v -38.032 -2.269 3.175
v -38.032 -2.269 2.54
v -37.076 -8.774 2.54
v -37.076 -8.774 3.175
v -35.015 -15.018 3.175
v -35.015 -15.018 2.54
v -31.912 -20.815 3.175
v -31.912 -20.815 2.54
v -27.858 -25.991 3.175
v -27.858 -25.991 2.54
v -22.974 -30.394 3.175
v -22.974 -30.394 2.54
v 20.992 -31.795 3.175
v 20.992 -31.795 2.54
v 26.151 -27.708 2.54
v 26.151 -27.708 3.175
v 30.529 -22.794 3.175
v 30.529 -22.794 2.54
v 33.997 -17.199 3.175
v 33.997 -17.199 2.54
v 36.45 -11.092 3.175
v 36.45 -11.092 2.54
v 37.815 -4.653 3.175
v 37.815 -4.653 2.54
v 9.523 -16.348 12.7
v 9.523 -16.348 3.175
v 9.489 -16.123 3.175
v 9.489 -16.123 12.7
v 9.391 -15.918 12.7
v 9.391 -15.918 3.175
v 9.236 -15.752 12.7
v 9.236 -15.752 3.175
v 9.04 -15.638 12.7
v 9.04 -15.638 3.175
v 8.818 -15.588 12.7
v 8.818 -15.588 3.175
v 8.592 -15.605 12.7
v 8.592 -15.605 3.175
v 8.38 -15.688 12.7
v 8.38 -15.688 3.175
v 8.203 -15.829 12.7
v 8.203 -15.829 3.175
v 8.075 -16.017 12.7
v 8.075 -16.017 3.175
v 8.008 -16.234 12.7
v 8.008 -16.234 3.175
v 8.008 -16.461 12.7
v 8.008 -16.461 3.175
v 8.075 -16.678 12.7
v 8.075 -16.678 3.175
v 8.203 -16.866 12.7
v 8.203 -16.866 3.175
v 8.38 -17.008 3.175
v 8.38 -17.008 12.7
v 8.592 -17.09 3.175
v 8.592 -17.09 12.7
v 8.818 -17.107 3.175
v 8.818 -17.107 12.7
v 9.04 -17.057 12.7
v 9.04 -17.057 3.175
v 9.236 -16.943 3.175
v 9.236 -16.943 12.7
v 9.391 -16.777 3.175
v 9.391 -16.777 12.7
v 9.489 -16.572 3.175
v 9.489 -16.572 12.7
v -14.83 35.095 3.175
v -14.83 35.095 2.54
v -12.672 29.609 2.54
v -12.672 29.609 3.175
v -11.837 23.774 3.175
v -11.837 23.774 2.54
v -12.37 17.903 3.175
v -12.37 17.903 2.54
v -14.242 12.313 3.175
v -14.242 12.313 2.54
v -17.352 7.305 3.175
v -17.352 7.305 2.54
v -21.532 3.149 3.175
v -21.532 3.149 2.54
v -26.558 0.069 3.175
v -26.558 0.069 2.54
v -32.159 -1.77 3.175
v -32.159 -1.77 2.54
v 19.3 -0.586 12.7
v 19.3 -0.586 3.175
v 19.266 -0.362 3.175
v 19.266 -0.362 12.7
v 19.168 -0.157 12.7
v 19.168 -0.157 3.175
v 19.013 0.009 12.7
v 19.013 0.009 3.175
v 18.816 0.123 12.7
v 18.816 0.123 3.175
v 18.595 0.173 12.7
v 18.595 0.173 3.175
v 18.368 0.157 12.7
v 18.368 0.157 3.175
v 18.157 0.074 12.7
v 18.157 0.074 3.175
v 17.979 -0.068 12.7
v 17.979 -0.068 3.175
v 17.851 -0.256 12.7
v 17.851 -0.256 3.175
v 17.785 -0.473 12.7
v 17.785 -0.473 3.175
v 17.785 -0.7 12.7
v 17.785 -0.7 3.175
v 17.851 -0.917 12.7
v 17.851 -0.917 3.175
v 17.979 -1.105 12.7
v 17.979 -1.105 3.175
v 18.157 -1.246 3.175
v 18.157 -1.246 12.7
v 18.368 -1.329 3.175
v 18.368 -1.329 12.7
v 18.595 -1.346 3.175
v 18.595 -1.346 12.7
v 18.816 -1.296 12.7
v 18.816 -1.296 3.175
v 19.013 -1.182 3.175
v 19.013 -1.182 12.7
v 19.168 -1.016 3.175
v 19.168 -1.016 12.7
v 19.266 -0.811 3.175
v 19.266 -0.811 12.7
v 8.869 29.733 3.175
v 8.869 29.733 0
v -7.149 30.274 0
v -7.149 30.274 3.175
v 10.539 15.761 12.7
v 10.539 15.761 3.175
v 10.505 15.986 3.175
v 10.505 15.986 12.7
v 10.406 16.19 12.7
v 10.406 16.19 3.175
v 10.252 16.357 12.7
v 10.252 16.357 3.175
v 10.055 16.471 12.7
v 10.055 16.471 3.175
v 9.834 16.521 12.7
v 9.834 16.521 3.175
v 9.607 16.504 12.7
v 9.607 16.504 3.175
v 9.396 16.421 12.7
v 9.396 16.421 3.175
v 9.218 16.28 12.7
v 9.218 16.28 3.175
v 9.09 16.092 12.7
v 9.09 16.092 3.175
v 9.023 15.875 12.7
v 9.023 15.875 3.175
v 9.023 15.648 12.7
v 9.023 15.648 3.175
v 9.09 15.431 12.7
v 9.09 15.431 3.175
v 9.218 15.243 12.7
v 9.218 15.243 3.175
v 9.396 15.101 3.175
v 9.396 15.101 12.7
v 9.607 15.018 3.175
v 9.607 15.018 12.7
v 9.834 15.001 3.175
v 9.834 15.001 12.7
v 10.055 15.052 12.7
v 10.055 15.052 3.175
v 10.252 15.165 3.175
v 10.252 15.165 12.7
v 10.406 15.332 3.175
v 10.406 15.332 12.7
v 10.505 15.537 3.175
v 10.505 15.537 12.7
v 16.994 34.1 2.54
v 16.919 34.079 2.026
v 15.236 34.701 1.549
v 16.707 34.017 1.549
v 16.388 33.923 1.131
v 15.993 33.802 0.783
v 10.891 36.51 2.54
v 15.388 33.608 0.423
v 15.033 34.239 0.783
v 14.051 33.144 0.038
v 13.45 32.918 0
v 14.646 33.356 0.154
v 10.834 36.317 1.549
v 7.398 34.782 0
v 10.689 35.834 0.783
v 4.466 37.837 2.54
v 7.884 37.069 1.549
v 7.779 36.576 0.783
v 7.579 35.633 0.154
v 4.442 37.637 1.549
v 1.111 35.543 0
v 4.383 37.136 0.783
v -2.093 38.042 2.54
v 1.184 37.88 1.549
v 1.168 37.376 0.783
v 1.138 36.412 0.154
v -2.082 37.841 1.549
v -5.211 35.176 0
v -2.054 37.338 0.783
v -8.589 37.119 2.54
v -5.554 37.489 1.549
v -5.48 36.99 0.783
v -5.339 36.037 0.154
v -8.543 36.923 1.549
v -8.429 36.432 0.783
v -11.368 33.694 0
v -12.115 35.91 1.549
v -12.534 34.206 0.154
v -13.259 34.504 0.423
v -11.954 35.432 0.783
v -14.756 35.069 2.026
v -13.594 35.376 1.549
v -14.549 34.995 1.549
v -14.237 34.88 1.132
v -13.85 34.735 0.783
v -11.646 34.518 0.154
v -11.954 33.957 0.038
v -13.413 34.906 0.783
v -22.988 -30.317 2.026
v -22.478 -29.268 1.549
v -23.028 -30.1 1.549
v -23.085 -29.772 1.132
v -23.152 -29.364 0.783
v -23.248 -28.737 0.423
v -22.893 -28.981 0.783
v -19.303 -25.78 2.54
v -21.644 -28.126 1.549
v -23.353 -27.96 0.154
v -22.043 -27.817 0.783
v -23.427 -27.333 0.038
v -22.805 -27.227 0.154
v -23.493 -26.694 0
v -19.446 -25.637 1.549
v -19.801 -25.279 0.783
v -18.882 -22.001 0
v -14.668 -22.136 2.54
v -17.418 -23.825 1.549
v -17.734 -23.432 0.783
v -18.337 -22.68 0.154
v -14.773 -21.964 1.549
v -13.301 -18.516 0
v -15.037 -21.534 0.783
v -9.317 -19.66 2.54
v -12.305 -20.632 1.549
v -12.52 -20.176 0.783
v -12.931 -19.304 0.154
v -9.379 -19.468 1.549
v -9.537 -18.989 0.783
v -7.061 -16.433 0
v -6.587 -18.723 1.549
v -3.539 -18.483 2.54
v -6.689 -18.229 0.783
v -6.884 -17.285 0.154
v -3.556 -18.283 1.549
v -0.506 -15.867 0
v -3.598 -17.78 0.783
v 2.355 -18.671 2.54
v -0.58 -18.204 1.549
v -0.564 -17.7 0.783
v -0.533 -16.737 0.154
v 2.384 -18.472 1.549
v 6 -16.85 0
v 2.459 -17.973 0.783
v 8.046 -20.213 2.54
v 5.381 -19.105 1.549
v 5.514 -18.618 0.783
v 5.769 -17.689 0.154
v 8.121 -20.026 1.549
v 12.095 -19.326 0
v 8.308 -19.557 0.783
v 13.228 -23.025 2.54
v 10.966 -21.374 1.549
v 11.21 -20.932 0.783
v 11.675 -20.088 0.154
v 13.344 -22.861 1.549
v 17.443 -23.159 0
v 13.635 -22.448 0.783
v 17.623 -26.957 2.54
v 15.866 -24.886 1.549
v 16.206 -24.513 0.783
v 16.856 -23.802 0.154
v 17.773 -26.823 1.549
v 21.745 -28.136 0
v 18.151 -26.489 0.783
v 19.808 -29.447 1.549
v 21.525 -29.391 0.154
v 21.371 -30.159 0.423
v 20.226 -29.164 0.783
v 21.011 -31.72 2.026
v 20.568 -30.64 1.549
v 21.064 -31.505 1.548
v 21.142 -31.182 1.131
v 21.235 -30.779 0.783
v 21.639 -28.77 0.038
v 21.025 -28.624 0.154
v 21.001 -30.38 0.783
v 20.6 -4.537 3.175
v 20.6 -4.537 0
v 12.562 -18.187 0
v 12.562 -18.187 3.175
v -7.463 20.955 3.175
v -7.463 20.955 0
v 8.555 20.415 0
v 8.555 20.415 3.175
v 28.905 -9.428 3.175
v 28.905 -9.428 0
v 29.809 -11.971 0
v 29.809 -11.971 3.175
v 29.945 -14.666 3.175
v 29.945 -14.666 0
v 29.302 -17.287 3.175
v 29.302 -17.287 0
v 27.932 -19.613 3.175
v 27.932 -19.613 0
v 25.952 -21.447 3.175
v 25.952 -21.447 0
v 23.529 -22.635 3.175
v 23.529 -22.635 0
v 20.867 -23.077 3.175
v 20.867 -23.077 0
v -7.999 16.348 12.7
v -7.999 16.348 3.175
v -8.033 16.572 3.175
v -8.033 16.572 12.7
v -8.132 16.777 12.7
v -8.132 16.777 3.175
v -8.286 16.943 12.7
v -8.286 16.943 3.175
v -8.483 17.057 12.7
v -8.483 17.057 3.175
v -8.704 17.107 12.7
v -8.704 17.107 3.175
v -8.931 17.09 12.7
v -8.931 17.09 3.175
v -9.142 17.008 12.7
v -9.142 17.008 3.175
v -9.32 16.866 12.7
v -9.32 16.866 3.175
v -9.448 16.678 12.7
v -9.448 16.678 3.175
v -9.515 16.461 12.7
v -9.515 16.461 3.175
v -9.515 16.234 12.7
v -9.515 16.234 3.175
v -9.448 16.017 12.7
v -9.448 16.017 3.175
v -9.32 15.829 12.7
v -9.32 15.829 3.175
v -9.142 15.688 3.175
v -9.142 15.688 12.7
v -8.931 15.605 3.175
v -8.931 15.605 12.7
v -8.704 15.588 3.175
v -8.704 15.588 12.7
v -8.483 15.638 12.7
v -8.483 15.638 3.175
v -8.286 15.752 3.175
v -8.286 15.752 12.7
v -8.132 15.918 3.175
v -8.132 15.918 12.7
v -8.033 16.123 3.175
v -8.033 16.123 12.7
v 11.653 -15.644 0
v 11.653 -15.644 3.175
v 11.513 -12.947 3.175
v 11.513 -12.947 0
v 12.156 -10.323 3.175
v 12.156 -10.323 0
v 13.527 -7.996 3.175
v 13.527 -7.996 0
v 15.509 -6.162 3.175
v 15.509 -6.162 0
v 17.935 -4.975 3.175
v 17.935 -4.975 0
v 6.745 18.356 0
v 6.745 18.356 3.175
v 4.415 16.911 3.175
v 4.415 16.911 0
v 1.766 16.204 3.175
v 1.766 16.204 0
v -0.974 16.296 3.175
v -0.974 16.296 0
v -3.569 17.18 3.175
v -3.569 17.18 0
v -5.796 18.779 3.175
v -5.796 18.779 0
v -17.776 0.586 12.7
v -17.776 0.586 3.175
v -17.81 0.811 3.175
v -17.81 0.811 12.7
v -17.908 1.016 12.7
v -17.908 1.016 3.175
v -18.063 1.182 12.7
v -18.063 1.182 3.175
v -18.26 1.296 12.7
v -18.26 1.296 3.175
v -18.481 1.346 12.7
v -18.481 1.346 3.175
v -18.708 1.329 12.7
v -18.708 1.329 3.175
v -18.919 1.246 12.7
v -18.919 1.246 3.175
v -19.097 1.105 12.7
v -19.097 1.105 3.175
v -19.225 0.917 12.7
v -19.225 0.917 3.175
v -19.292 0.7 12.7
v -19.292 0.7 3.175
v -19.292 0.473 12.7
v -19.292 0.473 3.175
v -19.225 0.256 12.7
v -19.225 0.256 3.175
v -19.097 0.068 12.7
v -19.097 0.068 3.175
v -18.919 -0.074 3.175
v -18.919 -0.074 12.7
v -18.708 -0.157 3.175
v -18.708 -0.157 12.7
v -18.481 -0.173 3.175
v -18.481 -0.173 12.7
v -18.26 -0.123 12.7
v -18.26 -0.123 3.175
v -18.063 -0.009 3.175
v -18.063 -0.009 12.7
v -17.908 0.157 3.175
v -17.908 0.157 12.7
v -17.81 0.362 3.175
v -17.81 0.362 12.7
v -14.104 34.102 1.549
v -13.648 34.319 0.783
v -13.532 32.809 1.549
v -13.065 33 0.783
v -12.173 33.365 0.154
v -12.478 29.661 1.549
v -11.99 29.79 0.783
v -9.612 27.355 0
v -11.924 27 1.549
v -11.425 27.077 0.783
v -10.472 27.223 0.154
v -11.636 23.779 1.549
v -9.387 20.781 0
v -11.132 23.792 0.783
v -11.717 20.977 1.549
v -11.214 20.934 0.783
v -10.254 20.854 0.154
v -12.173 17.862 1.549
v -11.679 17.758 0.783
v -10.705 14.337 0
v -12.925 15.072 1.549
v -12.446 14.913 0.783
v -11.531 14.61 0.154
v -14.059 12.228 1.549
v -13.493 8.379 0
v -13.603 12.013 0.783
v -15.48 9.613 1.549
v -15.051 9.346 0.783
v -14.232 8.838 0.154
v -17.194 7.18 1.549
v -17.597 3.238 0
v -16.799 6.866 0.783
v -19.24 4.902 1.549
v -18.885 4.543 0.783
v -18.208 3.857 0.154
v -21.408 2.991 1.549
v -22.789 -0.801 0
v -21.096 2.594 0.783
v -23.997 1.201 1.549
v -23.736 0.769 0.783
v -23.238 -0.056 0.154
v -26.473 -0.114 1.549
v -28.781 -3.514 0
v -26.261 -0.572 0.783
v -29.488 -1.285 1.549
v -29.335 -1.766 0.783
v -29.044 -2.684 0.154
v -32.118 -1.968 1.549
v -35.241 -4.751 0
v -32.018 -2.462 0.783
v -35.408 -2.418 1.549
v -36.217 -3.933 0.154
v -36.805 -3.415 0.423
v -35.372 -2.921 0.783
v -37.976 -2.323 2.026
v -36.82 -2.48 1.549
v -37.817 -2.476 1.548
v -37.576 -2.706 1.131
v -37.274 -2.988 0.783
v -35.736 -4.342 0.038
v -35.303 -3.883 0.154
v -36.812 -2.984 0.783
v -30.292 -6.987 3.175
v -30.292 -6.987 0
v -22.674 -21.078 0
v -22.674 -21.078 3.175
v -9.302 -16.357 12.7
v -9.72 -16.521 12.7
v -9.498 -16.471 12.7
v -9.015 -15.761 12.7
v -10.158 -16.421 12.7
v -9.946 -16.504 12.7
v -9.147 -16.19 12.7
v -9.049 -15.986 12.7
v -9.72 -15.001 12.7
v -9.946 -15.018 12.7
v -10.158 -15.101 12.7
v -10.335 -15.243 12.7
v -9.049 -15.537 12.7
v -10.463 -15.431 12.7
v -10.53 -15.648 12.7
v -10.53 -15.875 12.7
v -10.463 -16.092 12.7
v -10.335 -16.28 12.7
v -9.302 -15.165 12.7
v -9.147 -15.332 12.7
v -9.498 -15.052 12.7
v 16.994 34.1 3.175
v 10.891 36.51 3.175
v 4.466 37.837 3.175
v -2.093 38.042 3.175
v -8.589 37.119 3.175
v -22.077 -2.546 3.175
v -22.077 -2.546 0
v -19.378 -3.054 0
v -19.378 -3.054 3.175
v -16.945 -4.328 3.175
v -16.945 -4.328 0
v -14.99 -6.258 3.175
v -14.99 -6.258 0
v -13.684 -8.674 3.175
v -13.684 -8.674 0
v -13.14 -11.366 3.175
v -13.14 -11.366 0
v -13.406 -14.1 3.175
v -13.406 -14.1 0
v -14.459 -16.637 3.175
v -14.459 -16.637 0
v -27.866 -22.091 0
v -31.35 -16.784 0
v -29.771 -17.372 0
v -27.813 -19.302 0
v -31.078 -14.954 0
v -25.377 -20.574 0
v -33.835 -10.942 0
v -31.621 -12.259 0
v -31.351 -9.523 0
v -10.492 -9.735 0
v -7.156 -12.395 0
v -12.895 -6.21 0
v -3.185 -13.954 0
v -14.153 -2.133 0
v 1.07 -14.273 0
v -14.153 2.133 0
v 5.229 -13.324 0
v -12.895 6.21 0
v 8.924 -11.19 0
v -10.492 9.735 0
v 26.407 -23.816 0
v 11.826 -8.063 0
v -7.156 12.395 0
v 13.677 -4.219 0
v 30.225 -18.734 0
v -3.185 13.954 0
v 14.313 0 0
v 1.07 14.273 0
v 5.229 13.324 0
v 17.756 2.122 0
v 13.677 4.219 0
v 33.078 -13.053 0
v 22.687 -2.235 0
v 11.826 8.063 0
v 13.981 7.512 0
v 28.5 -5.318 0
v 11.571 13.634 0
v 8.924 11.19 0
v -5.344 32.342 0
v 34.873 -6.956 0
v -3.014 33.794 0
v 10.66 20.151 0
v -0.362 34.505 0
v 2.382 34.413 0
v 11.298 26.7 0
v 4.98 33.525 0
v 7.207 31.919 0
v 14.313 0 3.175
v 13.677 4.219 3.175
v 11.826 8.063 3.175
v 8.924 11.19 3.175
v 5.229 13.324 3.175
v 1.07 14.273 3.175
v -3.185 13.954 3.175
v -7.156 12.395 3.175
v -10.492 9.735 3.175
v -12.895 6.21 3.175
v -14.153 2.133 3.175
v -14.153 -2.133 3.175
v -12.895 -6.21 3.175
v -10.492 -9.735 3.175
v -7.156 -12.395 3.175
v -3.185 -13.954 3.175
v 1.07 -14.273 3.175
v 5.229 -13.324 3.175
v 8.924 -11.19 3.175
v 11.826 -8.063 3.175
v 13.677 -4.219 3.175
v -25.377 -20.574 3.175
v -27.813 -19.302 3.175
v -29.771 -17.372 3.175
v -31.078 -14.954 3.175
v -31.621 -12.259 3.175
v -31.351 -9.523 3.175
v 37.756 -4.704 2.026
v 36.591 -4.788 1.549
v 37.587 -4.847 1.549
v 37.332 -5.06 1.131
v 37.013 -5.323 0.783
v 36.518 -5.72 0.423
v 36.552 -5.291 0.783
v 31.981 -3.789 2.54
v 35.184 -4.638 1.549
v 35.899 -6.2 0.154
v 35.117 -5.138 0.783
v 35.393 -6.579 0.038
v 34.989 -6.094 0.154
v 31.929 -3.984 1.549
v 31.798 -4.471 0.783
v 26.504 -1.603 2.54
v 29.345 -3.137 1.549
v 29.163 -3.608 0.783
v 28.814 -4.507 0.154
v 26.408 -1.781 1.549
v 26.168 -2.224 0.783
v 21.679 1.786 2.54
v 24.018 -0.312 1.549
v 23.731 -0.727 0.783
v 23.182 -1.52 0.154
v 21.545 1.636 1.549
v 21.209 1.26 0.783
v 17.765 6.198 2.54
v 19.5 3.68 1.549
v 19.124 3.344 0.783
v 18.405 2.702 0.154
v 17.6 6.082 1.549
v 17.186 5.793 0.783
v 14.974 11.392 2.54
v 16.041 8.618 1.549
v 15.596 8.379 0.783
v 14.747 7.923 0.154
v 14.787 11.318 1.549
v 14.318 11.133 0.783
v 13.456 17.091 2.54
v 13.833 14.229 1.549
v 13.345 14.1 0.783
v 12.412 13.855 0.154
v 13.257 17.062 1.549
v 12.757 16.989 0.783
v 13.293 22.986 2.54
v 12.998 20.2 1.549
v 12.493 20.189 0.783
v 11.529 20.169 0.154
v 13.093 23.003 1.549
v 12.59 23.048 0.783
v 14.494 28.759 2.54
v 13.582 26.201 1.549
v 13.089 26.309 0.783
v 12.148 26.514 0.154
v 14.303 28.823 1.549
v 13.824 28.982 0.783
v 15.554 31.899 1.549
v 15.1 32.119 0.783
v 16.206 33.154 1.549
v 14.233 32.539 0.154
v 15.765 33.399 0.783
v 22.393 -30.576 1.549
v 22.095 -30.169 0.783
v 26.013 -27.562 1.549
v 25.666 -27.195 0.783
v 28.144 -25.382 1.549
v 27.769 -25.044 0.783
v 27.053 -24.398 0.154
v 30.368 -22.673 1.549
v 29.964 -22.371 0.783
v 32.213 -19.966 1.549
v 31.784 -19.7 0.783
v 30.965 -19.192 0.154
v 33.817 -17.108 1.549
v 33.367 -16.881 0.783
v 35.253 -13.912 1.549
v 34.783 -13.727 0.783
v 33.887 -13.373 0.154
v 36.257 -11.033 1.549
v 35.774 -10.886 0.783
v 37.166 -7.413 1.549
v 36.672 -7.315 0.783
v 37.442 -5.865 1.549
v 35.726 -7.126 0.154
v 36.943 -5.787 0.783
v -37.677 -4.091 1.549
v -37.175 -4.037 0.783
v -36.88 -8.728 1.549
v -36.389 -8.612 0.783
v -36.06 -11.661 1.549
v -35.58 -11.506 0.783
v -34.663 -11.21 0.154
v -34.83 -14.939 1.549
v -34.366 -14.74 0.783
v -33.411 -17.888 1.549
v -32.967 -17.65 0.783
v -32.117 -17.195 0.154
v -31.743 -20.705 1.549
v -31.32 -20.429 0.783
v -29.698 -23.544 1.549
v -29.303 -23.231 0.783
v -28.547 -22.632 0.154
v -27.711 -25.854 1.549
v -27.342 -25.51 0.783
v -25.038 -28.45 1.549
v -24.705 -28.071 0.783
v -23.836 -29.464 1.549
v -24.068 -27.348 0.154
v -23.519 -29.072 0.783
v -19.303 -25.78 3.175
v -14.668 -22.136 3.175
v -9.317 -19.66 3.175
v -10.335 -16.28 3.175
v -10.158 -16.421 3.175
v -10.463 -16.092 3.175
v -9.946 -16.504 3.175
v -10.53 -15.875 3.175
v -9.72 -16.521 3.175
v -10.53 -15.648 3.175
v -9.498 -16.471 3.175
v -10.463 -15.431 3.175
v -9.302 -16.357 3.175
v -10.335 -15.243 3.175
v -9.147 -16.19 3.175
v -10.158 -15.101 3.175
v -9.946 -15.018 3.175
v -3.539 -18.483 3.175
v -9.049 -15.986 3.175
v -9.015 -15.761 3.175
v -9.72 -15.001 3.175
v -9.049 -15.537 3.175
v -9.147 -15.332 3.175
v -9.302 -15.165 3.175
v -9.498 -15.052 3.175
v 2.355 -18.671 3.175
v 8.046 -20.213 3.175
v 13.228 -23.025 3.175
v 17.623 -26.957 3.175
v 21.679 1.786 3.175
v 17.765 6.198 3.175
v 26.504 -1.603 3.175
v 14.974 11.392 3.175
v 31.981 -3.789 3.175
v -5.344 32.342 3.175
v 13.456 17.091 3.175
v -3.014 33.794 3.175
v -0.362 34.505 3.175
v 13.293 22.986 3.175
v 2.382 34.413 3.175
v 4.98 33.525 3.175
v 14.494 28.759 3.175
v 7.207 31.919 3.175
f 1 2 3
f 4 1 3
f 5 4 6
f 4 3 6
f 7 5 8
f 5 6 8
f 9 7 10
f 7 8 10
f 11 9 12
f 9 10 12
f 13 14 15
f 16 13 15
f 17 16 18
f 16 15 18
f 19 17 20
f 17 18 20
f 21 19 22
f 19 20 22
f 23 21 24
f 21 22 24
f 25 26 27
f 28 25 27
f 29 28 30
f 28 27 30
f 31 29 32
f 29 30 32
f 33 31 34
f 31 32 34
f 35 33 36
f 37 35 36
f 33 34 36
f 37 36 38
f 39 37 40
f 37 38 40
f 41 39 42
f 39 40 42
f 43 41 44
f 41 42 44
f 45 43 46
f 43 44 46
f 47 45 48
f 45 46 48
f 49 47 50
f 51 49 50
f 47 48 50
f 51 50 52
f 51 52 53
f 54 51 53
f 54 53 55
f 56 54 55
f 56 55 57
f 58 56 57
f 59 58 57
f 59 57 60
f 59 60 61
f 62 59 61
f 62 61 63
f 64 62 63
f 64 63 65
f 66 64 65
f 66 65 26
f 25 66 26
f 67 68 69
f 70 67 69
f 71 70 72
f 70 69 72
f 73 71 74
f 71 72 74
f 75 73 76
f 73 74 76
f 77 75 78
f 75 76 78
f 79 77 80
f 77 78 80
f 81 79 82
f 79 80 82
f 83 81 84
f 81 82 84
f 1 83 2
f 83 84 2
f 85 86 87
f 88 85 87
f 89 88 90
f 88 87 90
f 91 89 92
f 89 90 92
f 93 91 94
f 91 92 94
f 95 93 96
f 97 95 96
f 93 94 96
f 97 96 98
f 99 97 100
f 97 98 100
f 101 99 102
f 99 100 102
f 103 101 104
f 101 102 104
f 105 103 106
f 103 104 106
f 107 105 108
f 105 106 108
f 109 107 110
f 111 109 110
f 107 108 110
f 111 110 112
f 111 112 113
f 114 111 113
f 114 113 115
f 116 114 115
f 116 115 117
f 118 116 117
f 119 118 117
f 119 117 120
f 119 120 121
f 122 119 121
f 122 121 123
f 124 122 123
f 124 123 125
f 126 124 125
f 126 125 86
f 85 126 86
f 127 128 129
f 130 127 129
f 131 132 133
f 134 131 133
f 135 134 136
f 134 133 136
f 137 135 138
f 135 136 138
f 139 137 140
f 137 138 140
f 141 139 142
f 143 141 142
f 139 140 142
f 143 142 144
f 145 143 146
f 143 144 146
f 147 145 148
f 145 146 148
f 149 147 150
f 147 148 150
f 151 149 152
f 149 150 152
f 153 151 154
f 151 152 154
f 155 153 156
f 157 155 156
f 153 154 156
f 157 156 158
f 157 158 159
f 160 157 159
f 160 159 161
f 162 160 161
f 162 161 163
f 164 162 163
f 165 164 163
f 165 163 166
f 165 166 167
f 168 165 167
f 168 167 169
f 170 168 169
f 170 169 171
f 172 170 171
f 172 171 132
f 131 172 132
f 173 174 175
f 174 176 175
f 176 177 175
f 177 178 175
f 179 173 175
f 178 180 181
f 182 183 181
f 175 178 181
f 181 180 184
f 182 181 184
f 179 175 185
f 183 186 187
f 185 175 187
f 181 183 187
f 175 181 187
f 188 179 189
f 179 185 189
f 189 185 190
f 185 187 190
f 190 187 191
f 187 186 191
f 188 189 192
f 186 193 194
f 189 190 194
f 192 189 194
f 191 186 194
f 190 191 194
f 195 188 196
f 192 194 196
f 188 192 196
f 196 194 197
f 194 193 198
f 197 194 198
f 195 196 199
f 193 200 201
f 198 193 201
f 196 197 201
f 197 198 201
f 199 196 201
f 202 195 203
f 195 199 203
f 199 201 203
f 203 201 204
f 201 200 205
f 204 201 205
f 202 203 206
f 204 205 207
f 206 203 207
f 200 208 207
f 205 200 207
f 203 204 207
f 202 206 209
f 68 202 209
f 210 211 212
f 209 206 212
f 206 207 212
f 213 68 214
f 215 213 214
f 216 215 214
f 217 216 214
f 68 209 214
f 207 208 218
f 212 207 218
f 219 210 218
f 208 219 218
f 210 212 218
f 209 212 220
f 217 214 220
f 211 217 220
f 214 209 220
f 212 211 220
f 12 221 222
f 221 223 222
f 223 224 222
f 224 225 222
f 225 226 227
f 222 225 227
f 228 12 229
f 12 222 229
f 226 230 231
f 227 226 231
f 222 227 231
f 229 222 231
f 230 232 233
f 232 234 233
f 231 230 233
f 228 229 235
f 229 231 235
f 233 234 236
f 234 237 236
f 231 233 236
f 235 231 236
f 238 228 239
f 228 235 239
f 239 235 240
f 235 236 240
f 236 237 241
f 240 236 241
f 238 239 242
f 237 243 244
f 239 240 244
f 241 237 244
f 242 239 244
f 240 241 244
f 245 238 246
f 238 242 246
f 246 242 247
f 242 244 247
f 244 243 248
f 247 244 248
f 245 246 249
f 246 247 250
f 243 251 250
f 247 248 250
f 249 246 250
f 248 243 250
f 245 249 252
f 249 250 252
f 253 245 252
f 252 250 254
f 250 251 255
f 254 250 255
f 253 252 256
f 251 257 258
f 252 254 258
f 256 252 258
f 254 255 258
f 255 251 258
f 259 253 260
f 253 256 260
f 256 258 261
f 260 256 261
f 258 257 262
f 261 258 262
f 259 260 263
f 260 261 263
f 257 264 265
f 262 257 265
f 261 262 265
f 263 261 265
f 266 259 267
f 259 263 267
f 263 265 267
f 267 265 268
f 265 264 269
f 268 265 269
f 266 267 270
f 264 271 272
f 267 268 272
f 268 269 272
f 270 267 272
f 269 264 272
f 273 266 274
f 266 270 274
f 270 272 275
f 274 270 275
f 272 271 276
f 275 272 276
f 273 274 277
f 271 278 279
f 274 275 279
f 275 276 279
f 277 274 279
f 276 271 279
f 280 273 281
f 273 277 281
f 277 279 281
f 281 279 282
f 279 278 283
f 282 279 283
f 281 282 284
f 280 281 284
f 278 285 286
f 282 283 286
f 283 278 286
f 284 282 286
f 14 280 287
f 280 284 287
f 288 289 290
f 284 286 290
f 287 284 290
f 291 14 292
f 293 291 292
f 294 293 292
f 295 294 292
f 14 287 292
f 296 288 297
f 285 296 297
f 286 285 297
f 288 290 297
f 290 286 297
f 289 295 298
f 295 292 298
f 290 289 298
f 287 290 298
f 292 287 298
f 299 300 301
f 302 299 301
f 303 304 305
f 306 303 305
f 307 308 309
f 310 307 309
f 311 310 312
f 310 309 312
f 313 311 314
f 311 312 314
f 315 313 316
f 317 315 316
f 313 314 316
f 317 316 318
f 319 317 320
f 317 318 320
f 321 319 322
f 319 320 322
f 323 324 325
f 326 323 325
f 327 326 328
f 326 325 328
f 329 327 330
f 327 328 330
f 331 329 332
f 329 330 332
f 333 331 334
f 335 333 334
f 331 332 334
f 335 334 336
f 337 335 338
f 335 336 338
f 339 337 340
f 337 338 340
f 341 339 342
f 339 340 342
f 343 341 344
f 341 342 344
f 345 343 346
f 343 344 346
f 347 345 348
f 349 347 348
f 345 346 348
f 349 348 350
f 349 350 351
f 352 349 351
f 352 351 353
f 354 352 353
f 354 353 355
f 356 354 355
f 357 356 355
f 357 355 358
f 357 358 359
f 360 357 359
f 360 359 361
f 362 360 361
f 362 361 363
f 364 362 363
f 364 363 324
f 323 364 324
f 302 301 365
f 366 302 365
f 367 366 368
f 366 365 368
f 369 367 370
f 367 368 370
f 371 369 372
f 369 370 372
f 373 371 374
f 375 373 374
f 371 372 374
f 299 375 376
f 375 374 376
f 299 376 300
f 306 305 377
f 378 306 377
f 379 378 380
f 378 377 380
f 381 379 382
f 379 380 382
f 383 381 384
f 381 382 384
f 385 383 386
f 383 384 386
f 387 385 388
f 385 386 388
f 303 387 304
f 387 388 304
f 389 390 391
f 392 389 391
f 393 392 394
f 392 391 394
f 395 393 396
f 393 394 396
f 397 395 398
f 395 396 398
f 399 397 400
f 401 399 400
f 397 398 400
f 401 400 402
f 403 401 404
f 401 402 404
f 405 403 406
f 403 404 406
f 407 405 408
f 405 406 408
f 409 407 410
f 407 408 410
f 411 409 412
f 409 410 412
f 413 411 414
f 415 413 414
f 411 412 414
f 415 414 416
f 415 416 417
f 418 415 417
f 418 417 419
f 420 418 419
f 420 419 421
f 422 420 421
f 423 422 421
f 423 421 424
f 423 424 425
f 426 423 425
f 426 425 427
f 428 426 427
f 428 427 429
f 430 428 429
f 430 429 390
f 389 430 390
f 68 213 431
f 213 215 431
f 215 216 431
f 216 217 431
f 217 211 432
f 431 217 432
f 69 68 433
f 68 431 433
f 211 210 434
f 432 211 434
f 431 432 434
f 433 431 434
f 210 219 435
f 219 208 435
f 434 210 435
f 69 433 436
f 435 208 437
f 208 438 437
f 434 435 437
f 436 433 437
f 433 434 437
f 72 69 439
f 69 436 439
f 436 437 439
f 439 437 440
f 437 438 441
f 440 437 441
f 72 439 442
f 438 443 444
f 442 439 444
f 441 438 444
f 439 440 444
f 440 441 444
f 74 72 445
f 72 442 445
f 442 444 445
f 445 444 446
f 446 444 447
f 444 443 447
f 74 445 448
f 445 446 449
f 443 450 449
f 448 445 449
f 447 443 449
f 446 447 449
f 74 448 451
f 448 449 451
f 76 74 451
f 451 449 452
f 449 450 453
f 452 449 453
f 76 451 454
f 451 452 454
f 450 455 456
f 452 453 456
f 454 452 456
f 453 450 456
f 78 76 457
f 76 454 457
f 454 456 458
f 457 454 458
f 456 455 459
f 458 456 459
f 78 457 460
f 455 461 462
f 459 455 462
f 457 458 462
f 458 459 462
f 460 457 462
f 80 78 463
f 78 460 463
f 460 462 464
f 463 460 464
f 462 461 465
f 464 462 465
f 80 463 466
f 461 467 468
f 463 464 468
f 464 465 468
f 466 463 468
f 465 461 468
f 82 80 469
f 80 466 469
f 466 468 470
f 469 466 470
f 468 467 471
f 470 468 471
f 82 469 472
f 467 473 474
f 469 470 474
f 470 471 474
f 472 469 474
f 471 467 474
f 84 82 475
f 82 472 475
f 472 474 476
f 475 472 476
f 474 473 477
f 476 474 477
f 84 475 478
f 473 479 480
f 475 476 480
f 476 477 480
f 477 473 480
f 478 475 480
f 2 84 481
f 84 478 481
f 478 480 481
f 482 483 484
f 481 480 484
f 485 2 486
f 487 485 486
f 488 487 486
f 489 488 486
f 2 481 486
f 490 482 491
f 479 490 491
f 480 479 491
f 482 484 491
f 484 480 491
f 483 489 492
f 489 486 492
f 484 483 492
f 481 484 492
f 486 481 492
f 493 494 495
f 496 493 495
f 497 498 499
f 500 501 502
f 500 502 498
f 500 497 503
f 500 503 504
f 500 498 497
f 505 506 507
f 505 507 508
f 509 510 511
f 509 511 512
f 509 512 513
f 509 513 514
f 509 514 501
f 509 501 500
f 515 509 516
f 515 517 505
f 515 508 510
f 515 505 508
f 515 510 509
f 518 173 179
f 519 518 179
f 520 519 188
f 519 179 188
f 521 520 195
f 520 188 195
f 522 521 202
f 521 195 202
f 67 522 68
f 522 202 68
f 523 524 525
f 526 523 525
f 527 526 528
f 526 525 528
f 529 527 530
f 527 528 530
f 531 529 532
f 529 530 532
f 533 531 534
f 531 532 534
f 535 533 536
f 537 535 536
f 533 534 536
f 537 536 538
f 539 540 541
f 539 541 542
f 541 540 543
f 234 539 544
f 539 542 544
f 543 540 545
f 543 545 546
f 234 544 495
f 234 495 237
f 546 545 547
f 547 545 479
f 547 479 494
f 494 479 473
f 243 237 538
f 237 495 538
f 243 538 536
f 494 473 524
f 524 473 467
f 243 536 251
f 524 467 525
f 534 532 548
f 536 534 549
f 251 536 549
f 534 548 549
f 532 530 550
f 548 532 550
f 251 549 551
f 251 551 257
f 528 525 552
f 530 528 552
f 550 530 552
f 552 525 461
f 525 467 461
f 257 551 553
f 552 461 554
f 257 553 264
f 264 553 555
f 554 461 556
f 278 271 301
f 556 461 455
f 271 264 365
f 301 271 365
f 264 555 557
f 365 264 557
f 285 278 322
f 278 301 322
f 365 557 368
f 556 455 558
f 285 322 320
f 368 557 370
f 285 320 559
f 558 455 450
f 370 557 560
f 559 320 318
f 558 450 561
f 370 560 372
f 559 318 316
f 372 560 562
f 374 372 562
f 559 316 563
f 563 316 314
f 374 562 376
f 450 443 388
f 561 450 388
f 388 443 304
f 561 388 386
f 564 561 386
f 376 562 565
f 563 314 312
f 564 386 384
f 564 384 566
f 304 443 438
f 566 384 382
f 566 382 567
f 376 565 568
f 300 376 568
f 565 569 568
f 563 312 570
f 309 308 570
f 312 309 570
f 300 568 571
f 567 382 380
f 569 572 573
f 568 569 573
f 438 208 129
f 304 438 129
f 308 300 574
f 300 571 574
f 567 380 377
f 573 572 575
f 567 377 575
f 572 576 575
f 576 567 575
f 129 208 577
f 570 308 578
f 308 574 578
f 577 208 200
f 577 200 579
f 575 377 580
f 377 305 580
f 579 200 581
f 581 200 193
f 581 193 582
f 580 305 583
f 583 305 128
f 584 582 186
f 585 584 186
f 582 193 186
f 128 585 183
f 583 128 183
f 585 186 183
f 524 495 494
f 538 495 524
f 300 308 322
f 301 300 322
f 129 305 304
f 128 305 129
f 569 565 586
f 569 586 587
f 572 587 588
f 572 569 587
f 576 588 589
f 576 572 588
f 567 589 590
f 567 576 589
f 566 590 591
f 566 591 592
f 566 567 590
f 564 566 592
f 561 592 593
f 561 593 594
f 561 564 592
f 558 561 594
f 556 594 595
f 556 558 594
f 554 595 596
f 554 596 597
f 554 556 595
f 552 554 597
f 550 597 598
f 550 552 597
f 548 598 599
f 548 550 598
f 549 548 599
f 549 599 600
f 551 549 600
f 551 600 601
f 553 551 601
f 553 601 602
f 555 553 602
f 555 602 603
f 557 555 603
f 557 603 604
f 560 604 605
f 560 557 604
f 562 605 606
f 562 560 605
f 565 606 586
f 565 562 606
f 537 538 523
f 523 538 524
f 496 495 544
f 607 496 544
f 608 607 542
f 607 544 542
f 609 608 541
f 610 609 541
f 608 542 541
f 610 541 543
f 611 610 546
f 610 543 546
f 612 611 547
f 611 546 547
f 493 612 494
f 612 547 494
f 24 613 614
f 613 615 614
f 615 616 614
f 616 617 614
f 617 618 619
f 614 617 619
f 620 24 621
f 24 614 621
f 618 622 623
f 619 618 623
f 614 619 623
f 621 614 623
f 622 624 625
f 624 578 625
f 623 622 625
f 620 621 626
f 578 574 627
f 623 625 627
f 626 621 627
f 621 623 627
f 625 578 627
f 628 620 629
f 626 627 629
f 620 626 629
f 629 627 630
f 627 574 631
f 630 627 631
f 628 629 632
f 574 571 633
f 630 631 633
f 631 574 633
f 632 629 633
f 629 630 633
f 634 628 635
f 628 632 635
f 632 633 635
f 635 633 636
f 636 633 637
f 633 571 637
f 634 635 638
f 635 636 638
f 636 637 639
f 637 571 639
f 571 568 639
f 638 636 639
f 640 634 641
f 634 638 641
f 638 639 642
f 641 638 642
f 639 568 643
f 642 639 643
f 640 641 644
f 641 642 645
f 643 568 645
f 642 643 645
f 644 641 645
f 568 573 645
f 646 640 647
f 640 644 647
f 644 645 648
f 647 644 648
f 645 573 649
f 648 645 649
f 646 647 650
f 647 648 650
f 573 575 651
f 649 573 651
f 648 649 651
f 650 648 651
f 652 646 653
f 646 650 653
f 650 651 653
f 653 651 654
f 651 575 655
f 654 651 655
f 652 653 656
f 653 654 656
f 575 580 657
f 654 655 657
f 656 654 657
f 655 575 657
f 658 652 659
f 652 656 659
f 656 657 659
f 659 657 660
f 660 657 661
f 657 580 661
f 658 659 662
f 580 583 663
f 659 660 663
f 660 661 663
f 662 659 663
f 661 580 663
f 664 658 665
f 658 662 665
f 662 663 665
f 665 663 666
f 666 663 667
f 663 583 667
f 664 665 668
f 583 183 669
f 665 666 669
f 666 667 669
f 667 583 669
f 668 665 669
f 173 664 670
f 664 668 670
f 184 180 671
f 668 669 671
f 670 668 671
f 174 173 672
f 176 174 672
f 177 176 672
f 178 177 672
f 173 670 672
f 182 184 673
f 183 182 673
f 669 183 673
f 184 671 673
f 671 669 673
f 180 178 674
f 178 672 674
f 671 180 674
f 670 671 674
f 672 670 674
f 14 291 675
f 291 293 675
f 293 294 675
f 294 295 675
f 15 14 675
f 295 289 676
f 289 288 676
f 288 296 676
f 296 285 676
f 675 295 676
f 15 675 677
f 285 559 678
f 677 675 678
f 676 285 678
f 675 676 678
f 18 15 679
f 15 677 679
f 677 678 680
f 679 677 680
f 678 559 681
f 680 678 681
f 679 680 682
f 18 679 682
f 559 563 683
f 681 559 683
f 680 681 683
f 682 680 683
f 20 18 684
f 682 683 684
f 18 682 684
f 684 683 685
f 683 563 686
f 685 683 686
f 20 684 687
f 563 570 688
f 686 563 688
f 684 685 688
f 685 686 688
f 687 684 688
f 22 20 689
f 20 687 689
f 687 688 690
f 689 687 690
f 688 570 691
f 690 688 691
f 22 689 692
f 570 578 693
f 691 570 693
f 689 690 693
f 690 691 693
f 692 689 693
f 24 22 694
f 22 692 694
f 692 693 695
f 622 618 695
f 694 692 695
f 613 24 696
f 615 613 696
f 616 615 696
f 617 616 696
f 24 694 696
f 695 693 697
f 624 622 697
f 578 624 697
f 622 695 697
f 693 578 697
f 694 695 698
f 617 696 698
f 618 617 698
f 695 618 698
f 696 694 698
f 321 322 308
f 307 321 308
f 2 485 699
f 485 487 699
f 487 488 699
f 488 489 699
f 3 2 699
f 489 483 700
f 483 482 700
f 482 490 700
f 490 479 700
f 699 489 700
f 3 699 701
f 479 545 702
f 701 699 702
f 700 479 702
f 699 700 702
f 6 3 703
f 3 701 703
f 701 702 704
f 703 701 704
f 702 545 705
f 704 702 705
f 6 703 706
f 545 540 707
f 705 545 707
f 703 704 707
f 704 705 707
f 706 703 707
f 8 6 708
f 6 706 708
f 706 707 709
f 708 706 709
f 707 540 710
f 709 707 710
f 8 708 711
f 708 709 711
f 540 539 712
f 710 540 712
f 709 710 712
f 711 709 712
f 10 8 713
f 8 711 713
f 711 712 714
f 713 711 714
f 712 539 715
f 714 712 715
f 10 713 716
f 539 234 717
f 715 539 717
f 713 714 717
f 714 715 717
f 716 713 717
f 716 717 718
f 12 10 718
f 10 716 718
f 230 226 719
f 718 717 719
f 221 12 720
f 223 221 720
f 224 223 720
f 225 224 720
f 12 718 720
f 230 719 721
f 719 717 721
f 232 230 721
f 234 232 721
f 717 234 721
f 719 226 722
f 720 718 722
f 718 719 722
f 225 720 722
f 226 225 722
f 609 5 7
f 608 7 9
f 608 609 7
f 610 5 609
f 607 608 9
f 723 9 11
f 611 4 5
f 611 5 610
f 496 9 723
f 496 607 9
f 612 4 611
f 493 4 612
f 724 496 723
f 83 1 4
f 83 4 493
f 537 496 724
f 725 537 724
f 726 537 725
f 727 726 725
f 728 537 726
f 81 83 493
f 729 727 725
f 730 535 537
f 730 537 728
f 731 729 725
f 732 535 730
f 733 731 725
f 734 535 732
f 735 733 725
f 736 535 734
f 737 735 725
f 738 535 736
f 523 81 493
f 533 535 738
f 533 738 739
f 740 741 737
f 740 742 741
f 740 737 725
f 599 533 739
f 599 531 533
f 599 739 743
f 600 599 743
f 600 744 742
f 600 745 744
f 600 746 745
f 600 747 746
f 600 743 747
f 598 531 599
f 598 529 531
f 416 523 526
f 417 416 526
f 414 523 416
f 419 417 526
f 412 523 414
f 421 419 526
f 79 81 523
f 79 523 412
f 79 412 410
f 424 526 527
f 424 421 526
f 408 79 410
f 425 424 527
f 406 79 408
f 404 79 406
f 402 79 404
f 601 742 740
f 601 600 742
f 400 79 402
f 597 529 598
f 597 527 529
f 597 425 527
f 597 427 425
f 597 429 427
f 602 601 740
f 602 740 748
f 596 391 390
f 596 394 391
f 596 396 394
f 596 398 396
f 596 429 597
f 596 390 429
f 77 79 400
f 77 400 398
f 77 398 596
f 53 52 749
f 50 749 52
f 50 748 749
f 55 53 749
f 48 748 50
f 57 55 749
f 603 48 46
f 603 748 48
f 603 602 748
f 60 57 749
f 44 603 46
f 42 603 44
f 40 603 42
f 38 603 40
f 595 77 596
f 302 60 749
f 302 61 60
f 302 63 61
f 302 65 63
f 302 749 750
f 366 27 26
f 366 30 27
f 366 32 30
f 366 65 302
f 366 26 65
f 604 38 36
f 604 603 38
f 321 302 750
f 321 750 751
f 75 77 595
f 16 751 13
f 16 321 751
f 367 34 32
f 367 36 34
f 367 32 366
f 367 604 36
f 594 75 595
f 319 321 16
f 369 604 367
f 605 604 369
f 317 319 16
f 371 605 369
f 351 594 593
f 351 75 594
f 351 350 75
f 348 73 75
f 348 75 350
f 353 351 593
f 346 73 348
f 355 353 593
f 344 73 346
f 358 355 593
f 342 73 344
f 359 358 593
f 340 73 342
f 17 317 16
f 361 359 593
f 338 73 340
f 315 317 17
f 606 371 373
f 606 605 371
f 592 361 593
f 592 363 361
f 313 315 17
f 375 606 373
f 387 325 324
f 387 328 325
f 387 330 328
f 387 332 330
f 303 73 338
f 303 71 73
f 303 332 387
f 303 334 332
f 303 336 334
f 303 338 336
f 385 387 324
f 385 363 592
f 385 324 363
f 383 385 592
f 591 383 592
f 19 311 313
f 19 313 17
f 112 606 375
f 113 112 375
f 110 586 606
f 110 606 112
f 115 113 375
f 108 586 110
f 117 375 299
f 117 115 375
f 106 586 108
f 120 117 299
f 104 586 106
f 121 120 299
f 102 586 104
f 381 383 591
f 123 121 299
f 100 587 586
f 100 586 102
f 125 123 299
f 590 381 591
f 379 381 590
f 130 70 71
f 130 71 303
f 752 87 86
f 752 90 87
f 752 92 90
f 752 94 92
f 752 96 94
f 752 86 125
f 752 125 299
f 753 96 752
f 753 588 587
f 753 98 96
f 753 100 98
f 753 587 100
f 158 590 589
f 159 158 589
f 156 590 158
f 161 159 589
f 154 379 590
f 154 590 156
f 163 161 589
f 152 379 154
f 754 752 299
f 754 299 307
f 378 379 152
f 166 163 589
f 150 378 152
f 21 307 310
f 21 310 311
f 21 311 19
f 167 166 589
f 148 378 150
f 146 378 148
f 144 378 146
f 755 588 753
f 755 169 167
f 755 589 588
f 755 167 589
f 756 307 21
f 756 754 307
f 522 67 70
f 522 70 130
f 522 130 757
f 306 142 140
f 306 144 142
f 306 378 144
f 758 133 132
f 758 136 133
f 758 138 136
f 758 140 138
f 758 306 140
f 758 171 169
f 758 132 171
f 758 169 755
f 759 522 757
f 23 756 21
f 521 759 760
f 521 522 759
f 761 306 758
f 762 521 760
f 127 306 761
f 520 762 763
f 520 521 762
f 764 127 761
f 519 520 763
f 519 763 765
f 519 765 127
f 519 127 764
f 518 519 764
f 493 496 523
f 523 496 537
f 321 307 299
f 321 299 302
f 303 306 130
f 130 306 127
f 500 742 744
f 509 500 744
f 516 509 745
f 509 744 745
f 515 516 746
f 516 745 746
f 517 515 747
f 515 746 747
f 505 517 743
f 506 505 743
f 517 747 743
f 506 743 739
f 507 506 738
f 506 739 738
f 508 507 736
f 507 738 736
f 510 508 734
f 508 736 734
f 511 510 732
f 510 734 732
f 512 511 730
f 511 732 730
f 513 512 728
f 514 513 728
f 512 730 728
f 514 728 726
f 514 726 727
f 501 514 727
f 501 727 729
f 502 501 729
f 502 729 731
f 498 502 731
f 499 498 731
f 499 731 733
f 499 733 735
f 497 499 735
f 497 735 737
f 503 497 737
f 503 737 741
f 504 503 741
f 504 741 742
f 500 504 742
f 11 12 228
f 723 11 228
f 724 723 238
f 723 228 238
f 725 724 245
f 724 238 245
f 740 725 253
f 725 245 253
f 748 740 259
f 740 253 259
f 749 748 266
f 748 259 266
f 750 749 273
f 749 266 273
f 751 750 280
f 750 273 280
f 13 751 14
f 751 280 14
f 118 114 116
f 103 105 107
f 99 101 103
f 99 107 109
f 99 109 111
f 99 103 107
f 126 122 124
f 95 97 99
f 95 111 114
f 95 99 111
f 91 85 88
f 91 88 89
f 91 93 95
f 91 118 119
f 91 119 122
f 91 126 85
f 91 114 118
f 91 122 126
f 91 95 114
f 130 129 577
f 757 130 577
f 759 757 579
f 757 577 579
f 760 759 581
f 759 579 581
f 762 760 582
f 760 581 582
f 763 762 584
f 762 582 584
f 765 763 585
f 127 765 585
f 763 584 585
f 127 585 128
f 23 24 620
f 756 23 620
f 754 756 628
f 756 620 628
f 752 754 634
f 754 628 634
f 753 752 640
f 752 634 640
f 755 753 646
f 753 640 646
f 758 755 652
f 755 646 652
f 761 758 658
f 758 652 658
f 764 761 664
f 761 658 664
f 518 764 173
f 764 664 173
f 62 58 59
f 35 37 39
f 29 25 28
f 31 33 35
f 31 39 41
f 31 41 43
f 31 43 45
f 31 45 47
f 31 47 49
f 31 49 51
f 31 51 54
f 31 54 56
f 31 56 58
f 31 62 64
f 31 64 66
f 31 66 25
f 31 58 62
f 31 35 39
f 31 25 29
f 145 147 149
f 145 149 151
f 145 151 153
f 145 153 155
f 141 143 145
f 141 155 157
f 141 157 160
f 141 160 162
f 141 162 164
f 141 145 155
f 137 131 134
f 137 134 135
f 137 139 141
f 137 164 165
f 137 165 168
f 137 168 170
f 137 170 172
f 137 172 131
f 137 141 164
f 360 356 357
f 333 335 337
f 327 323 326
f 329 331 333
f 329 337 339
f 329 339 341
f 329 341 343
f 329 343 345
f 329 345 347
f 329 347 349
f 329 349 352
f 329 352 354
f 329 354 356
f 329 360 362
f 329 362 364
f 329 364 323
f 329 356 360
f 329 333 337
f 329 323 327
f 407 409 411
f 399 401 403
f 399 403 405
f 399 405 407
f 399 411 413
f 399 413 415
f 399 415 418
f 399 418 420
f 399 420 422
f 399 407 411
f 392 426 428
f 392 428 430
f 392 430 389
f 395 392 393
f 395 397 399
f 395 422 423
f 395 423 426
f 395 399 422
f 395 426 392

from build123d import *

# Parameters (mm, degrees)
F0_R     = 0.762
F0_R_2   = 14.3129
F1_DEPTH = 3.175
F2_R     = 2.54
F3_DEPTH = 12.7


with BuildPart() as f1:
    # F0 (on Top) → F1 (new body)
    with BuildSketch(Plane.XY):
        with BuildLine():
            ThreePointArc((37.814818885, -4.6528993857), (16.2183640692, 8.713670097), (16.9939270688, 34.1000944688))
            ThreePointArc((16.9939270688, 34.1000944688), (1.1909176957, 38.0813827879), (-14.8299813197, 35.0953223957))
            ThreePointArc((-14.8299813197, 35.0953223957), (-15.6508840085, 9.7188762367), (-38.0323831061, -2.2688841474))
            ThreePointArc((-38.0323831061, -2.2688841474), (-33.5888120947, -17.9833729335), (-22.9742885145, -30.3939478721))
            ThreePointArc((-22.9742885145, -30.3939478721), (-0.5866848831, -18.4058352173), (20.9920077442, -31.7953709031))
            ThreePointArc((20.9920077442, -31.7953709031), (32.3842423806, -20.0716428185), (37.814818885, -4.6528993857))
        make_face()
        with BuildLine():
            ThreePointArc((-22.6742041591, -21.077906737), (-30.5143778905, -16.2115761649), (-30.2921493088, -6.9866039788))
            Line((-30.2921493088, -6.9866039788), (-22.6742041591, -21.077906737))
        make_face(mode=Mode.SUBTRACT)
        with Locations((-9.7768361415, -15.7612173143)):
            Circle(F0_R, mode=Mode.SUBTRACT)
        with BuildLine():
            ThreePointArc((-22.077246757, -2.5455187134), (-14.2471455868, -7.4172946457), (-14.4593016073, -16.6368214716))
            Line((-14.4593016073, -16.6368214716), (-22.077246757, -2.5455187134))
        make_face(mode=Mode.SUBTRACT)
        with Locations((8.761196518, -16.3475971243)):
            Circle(F0_R, mode=Mode.SUBTRACT)
        with BuildLine():
            ThreePointArc((12.5619529023, -18.1867123268), (12.756507598, -9.1097250706), (20.6001486004, -4.5373247159))
            Line((20.6001486004, -4.5373247159), (12.5619529023, -18.1867123268))
        make_face(mode=Mode.SUBTRACT)
        with Locations((18.5380326595, -0.58637981)):
            Circle(F0_R, mode=Mode.SUBTRACT)
        with BuildLine():
            Line((20.8666791326, -23.0774090058), (28.9048748307, -9.4280213948))
            ThreePointArc((28.9048748307, -9.4280213948), (28.7016006579, -18.4998737054), (20.8666791326, -23.0774090058))
        make_face(mode=Mode.SUBTRACT)
        with Locations((-18.5380326595, 0.58637981)):
            Circle(F0_R, mode=Mode.SUBTRACT)
        with Locations((-8.761196518, 16.3475971243)):
            Circle(F0_R, mode=Mode.SUBTRACT)
        Circle(F0_R_2, mode=Mode.SUBTRACT)
        with BuildLine():
            ThreePointArc((8.554840384, 20.4151336434), (0.3927024044, 16.1488375122), (-7.4634526605, 20.9553546163))
            Line((-7.4634526605, 20.9553546163), (8.554840384, 20.4151336434))
        make_face(mode=Mode.SUBTRACT)
        with Locations((9.7768361415, 15.7612173143)):
            Circle(F0_R, mode=Mode.SUBTRACT)
        with BuildLine():
            Line((8.86910012, 29.7333659897), (-7.1491929245, 30.2735869625))
            ThreePointArc((-7.1491929245, 30.2735869625), (1.0136418787, 34.5605448721), (8.86910012, 29.7333659897))
        make_face(mode=Mode.SUBTRACT)
    extrude(amount=F1_DEPTH)

    # F2
    f2_edges = [f1.edges().sort_by_distance(p)[0] for p in [
        (-15.650884, 9.718876, 0),
        (1.190918, 38.081383, 0),
        (-0.586685, -18.405835, 0),
        (32.384242, -20.071643, 0),
        (16.218364, 8.71367, 0),
        (-33.588812, -17.983373, 0),
    ]]
    fillet(f2_edges, radius=F2_R)

    # F0 (on Top) → F3 (join)
    with BuildSketch(Plane.XY):
        with Locations((-8.761196518, 16.3475971243)):
            Circle(F0_R)
        with Locations((-18.5380326595, 0.58637981)):
            Circle(F0_R)
        with Locations((-9.7768361415, -15.7612173143)):
            Circle(F0_R)
        with Locations((8.761196518, -16.3475971243)):
            Circle(F0_R)
        with Locations((18.5380326595, -0.58637981)):
            Circle(F0_R)
        with Locations((9.7768361415, 15.7612173143)):
            Circle(F0_R)
    extrude(amount=F3_DEPTH)


solid = f1.part
